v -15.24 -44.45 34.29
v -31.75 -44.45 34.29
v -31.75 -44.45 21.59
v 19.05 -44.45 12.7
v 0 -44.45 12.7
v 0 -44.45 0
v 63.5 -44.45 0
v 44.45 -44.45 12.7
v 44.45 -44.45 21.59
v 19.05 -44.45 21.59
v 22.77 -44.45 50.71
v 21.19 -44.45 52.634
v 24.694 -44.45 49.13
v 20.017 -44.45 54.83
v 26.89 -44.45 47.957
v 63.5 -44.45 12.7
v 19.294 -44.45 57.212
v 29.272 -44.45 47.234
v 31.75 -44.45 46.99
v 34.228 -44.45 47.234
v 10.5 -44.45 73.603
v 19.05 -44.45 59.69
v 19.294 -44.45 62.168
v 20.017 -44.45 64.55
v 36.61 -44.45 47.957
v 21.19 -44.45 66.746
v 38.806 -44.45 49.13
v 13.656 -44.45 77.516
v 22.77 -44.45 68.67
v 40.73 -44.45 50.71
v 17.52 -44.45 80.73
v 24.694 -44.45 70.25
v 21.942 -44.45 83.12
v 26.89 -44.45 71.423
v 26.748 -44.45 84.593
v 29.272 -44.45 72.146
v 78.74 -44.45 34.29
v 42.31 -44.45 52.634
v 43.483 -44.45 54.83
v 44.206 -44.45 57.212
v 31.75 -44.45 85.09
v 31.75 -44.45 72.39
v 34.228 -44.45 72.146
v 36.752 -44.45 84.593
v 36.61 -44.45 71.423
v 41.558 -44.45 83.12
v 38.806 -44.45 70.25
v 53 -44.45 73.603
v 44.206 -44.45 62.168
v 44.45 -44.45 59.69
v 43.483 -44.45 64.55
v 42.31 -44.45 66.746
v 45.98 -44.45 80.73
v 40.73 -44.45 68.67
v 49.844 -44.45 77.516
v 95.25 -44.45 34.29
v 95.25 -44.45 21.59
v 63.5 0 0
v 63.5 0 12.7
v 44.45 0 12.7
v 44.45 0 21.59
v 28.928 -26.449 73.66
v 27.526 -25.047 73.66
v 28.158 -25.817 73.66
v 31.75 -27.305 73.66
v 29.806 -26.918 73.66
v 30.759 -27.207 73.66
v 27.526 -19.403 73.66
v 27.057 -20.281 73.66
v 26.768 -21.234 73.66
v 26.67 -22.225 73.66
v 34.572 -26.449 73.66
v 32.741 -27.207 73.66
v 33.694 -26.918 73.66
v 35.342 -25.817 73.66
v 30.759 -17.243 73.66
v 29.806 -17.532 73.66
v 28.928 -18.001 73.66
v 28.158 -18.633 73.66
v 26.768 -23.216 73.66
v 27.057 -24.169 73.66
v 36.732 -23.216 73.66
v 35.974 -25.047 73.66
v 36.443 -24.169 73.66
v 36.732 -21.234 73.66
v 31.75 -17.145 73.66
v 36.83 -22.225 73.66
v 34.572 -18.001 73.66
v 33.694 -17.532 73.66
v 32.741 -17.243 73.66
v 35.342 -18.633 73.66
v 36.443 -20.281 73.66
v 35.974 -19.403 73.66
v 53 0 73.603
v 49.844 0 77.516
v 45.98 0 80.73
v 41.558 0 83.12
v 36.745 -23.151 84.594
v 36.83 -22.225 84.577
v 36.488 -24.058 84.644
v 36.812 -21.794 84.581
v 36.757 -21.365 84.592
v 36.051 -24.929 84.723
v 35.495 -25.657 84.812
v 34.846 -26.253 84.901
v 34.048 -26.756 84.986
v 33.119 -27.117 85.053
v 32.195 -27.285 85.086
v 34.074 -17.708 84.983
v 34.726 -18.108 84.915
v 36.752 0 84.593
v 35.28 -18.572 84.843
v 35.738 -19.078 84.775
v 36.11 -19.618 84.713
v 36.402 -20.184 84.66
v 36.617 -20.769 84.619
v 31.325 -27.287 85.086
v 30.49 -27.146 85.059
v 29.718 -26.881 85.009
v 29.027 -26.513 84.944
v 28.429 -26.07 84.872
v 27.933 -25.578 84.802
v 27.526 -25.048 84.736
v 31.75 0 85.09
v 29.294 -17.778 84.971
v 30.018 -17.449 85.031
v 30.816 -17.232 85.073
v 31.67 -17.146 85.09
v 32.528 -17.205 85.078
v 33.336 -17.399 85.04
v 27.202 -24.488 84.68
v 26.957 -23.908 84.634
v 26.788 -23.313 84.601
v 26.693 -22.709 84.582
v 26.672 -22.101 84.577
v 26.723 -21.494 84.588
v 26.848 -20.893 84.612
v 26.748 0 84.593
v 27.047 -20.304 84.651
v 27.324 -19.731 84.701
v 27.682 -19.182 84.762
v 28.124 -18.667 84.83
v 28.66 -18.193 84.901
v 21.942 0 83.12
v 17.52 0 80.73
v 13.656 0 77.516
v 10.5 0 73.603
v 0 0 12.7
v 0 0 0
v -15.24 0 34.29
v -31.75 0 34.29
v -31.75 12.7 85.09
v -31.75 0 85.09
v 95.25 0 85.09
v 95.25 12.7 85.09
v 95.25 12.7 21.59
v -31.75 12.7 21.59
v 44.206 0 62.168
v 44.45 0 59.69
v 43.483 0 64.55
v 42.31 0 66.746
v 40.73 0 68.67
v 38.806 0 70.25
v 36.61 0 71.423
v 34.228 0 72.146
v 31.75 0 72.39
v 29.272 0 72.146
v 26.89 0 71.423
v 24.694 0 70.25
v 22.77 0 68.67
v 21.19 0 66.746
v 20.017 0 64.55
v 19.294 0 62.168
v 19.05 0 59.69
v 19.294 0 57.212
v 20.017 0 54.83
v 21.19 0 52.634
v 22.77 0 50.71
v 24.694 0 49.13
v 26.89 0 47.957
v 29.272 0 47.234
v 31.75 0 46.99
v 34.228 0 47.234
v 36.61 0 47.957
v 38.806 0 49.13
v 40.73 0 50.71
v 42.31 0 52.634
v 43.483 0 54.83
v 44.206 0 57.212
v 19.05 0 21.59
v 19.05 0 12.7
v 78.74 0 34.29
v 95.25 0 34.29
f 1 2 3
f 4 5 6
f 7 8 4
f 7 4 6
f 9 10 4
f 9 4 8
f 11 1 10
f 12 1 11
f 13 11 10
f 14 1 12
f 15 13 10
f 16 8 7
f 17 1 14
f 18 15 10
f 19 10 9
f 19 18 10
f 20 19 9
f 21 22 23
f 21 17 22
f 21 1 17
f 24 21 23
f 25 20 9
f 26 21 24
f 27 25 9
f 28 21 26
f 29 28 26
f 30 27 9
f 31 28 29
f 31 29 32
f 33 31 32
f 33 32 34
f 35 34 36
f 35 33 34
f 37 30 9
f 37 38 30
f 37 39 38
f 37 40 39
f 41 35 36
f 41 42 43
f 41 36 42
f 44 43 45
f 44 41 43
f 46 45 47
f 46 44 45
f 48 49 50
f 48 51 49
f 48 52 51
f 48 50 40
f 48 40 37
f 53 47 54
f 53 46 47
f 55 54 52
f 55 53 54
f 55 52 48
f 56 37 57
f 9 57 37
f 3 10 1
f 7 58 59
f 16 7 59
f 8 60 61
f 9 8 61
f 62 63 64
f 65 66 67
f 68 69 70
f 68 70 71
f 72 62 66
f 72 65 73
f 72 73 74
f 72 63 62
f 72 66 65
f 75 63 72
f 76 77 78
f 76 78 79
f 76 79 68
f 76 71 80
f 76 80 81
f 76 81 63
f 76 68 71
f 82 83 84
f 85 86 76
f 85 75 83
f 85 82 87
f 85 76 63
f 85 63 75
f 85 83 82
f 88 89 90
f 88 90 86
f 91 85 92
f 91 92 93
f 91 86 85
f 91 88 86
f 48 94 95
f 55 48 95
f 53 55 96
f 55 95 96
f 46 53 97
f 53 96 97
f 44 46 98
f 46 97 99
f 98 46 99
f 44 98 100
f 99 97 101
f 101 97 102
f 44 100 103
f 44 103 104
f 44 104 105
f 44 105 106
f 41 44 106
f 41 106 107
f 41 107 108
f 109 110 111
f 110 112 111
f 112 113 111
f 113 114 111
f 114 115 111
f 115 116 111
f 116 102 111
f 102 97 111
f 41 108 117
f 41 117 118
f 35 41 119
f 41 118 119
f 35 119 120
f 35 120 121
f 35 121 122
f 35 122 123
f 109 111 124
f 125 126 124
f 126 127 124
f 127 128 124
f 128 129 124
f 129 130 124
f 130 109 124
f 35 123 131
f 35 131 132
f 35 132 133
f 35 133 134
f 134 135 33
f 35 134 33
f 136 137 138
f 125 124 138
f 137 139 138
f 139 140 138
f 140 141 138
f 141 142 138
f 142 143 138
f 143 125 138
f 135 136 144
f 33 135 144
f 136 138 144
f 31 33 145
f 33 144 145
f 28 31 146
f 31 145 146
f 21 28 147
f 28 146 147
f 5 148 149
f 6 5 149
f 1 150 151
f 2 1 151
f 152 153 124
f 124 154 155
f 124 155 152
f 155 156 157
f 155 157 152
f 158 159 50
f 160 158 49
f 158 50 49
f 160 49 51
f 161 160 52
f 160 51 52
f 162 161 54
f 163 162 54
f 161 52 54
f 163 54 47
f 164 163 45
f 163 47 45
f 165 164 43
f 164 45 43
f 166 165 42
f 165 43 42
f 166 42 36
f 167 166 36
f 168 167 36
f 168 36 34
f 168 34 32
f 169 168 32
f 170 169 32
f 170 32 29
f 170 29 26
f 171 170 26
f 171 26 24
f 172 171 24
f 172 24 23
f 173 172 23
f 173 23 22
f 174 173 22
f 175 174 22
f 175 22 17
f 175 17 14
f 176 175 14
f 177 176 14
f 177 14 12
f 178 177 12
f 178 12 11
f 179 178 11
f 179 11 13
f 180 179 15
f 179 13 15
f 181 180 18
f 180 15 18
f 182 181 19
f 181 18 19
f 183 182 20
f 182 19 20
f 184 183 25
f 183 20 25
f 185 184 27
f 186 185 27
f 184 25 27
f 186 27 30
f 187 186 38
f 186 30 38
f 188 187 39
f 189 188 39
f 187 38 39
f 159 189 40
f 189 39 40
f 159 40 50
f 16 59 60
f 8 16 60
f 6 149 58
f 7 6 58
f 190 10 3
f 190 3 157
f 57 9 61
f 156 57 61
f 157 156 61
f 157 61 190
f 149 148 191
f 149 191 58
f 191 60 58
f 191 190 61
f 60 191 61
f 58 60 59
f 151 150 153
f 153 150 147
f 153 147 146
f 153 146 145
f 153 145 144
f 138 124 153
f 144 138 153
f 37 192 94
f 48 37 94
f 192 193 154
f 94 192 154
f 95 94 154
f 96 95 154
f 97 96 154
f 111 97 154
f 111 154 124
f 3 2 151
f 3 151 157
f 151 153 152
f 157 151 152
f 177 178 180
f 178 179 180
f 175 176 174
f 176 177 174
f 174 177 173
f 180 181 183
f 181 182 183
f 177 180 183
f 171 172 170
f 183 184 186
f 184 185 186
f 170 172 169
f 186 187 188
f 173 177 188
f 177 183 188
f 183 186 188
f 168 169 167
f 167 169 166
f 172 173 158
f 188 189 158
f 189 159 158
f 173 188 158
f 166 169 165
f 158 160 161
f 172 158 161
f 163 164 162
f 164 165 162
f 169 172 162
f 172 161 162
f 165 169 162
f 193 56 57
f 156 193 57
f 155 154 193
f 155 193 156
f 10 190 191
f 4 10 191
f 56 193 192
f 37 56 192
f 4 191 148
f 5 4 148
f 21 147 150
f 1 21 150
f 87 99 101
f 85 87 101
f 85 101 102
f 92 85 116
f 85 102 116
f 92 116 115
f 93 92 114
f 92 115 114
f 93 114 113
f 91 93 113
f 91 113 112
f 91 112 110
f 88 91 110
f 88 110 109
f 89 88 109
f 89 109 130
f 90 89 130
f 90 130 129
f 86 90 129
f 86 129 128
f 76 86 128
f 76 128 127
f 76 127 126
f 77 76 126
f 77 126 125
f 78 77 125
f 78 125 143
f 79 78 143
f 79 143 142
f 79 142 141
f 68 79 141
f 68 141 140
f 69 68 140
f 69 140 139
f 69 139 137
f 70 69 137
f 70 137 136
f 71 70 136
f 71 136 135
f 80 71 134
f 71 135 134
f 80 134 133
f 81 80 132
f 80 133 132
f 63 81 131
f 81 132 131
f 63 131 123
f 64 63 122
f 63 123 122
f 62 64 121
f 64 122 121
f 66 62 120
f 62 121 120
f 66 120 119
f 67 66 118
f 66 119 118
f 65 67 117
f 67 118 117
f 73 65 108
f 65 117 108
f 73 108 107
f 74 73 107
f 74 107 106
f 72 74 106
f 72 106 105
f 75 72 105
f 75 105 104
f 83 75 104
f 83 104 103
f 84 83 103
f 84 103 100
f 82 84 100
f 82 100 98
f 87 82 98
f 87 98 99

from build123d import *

# Parameters (mm, degrees)
F1_DEPTH = 44.45
F2_R     = 12.7
F3_DEPTH = 45.72
F4_W     = 12.7
F4_H     = 63.5
F5_DEPTH = 127
F6_R     = 5.08
F7_DEPTH = 11.43


with BuildPart() as f1:
    # F0 (on Front) → F1 (new body)
    with BuildSketch(Plane.XZ):
        with BuildLine():
            Line((0, 12.7), (0, 0))
            Line((0, 0), (63.5, 0))
            Line((63.5, 0), (63.5, 12.7))
            Line((63.5, 12.7), (44.45, 12.7))
            Line((44.45, 12.7), (44.45, 21.59))
            Line((44.45, 21.59), (95.25, 21.59))
            Line((95.25, 21.59), (95.25, 34.29))
            Line((95.25, 34.29), (78.74, 34.29))
            Line((78.74, 34.29), (53.000424, 73.603284))
            ThreePointArc((53.000424, 73.603284), (31.75, 85.09), (10.499576, 73.603284))
            Line((10.499576, 73.603284), (-15.24, 34.29))
            Line((-15.24, 34.29), (-31.75, 34.29))
            Line((-31.75, 34.29), (-31.75, 21.59))
            Line((-31.75, 21.59), (19.05, 21.59))
            Line((19.05, 21.59), (19.05, 12.7))
            Line((19.05, 12.7), (0, 12.7))
        make_face()
    extrude(amount=F1_DEPTH)

    # F2 (on face) → F3 (cut)
    with BuildSketch(Plane.XZ.offset(44.45)):
        with Locations((31.75, 59.69)):
            Circle(F2_R)
    extrude(amount=-F3_DEPTH, mode=Mode.SUBTRACT)

    # F4 (on face) → F5 (join)
    with BuildSketch(Plane.YZ.offset(95.25)):
        with Locations((6.35, 53.34)):
            Rectangle(F4_W, F4_H)
    extrude(amount=-F5_DEPTH)

    # F6 (on face) → F7 (cut)
    with BuildSketch(Plane.XY.offset(85.09)):
        with Locations((31.75, -22.225)):
            Circle(F6_R)
    extrude(amount=-F7_DEPTH, mode=Mode.SUBTRACT)


solid = f1.part
